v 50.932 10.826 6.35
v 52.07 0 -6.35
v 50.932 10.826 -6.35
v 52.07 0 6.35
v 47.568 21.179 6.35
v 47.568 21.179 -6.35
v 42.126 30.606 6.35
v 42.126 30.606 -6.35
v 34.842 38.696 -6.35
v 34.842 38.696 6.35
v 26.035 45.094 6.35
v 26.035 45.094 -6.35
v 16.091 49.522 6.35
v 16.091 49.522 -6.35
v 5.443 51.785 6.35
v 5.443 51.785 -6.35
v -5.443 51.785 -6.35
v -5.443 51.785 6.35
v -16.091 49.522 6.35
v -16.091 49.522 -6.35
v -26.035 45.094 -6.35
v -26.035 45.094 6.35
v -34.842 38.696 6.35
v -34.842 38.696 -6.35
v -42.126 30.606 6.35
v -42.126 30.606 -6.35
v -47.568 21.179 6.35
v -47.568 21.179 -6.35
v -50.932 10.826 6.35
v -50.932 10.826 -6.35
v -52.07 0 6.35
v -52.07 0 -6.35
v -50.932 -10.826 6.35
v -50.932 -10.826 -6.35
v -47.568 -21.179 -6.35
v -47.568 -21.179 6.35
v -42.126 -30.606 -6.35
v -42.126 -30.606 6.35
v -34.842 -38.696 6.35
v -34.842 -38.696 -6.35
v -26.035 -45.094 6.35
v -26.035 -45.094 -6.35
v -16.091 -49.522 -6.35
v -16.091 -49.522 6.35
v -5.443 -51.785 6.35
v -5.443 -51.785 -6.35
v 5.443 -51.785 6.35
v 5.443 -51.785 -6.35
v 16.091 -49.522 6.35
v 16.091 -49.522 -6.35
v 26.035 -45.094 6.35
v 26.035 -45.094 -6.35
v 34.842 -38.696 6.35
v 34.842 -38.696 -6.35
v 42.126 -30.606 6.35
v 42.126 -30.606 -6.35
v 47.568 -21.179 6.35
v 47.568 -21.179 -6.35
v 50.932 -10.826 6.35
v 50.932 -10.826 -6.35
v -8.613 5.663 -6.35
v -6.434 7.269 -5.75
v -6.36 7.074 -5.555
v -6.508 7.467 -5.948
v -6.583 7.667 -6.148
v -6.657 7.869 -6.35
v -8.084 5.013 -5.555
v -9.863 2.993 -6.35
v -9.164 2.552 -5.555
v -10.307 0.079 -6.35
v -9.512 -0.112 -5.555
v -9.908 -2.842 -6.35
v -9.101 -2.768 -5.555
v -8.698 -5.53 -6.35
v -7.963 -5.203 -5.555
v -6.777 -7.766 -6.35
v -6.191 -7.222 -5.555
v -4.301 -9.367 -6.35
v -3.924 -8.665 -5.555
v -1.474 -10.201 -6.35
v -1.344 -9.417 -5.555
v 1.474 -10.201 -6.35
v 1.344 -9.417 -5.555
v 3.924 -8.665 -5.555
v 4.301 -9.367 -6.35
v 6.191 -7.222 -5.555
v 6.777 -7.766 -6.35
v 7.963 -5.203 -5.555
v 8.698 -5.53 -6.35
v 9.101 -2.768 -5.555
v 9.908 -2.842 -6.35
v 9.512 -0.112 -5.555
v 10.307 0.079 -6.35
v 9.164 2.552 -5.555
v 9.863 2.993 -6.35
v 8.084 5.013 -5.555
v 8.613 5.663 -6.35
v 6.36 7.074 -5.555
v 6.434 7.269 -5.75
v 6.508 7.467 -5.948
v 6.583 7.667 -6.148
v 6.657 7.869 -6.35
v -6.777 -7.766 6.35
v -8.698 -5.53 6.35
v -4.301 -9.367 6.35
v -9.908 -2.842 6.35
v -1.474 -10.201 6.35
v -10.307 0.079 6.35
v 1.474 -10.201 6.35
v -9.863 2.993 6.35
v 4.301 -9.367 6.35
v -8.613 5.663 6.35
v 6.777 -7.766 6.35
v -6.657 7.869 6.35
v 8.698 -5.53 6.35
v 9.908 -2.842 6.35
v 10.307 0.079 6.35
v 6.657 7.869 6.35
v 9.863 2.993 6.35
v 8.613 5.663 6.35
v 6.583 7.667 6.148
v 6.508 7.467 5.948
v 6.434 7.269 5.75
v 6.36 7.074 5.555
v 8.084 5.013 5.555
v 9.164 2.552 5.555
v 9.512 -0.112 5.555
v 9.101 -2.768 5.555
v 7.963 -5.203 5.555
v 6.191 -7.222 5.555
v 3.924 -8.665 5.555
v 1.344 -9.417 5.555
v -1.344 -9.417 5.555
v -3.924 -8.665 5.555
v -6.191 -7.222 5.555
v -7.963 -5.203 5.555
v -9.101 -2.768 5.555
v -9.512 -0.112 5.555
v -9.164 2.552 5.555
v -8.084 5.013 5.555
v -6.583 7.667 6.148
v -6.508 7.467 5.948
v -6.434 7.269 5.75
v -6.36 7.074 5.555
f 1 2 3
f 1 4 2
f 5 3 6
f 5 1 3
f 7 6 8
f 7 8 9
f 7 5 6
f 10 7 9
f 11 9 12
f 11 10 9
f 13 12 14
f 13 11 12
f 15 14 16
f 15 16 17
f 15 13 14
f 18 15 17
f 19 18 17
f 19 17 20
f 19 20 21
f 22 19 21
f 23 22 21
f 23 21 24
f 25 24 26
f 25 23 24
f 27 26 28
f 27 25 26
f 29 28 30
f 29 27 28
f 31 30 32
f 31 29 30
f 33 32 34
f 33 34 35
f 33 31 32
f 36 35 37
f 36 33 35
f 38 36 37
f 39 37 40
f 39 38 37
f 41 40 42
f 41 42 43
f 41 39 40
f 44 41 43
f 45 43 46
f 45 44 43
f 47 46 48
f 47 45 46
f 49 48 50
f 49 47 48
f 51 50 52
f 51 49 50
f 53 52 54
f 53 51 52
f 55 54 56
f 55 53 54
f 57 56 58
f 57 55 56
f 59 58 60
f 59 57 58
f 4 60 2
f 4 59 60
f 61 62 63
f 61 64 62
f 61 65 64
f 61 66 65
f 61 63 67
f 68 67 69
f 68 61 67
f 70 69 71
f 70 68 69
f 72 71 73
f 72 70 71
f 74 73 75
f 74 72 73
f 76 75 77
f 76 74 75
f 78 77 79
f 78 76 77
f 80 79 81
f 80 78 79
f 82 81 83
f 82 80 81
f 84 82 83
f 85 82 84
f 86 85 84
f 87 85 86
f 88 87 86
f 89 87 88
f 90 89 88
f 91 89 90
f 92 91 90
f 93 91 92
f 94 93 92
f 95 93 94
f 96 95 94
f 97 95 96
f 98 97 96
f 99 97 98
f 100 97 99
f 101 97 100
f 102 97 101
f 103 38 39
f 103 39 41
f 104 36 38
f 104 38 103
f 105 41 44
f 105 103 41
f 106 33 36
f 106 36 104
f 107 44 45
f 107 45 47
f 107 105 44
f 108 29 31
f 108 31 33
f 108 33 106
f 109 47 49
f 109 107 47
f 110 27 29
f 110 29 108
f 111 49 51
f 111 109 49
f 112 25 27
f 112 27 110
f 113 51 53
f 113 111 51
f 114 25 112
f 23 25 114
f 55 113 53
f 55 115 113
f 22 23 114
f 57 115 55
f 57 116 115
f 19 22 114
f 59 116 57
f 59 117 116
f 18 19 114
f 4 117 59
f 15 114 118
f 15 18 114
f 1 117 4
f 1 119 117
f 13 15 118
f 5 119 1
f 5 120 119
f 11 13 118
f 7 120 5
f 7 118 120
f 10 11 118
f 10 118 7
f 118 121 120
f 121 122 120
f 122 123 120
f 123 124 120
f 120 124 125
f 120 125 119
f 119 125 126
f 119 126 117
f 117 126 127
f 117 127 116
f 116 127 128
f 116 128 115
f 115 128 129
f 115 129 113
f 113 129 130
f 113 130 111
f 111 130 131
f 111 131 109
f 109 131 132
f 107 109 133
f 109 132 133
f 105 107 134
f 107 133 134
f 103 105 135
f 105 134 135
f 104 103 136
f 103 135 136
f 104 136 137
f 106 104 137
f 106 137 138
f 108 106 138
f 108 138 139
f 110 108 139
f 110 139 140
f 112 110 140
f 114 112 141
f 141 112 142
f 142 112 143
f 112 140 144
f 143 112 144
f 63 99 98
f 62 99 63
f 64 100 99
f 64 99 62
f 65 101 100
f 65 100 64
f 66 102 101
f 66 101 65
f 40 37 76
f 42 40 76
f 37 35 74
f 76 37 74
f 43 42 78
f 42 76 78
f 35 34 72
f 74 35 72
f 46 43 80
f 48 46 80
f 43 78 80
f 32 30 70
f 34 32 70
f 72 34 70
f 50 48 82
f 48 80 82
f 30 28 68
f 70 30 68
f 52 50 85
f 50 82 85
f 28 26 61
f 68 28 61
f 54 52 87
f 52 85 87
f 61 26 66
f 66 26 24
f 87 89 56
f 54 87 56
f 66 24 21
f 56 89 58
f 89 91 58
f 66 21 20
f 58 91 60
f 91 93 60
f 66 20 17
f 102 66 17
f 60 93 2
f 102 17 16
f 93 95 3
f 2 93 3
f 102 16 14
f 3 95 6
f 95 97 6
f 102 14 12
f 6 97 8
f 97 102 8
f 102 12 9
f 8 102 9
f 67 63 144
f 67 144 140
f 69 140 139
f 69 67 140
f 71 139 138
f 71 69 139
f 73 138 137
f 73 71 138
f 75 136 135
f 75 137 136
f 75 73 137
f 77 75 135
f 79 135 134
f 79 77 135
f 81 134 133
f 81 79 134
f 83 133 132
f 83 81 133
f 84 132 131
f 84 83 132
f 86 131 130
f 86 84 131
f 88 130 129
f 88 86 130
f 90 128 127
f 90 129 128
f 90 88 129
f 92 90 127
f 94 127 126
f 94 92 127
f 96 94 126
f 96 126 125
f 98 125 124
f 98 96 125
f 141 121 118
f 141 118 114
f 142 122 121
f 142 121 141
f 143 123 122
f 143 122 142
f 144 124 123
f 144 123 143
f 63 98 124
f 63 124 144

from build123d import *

# Parameters (mm, degrees)
SKETCH1_R           = 52.07
SKETCH1_R_2         = 9.5123
EXTRUDE1_DEPTH      = 6.35
BOSS_EXTRUDE1_DEPTH = 12.7
CHAMFER3_SIZE       = 0.79502


with BuildPart() as part:
    # Sketch1 → Extrude1 (new, symmetric)
    with BuildSketch(Plane.XY):
        Circle(SKETCH1_R)
        Circle(SKETCH1_R_2, mode=Mode.SUBTRACT)
    extrude(amount=EXTRUDE1_DEPTH, both=True)

    # Sketch3 → Boss-Extrude1 (add)
    with BuildSketch(Plane(origin=(0, 0, -6.35), x_dir=(-1, 0, 0), z_dir=(0, 0, -1))):
        with BuildLine():
            Line((-6.359543229, 7.0739), (6.359543229, 7.0739))
            ThreePointArc((6.359543229, 7.0739), (0, 9.5123), (-6.359543229, 7.0739))
        make_face()
    extrude(amount=-BOSS_EXTRUDE1_DEPTH)

    # Chamfer3
    chamfer3_edges = [part.edges().sort_by_distance(p)[0] for p in [
        (0, -9.5123, -6.35),
        (0, 7.0739, -6.35),
        (0, 7.0739, 6.35),
        (0, -9.5123, 6.35),
    ]]
    chamfer(chamfer3_edges, length=CHAMFER3_SIZE)


solid = part.part
